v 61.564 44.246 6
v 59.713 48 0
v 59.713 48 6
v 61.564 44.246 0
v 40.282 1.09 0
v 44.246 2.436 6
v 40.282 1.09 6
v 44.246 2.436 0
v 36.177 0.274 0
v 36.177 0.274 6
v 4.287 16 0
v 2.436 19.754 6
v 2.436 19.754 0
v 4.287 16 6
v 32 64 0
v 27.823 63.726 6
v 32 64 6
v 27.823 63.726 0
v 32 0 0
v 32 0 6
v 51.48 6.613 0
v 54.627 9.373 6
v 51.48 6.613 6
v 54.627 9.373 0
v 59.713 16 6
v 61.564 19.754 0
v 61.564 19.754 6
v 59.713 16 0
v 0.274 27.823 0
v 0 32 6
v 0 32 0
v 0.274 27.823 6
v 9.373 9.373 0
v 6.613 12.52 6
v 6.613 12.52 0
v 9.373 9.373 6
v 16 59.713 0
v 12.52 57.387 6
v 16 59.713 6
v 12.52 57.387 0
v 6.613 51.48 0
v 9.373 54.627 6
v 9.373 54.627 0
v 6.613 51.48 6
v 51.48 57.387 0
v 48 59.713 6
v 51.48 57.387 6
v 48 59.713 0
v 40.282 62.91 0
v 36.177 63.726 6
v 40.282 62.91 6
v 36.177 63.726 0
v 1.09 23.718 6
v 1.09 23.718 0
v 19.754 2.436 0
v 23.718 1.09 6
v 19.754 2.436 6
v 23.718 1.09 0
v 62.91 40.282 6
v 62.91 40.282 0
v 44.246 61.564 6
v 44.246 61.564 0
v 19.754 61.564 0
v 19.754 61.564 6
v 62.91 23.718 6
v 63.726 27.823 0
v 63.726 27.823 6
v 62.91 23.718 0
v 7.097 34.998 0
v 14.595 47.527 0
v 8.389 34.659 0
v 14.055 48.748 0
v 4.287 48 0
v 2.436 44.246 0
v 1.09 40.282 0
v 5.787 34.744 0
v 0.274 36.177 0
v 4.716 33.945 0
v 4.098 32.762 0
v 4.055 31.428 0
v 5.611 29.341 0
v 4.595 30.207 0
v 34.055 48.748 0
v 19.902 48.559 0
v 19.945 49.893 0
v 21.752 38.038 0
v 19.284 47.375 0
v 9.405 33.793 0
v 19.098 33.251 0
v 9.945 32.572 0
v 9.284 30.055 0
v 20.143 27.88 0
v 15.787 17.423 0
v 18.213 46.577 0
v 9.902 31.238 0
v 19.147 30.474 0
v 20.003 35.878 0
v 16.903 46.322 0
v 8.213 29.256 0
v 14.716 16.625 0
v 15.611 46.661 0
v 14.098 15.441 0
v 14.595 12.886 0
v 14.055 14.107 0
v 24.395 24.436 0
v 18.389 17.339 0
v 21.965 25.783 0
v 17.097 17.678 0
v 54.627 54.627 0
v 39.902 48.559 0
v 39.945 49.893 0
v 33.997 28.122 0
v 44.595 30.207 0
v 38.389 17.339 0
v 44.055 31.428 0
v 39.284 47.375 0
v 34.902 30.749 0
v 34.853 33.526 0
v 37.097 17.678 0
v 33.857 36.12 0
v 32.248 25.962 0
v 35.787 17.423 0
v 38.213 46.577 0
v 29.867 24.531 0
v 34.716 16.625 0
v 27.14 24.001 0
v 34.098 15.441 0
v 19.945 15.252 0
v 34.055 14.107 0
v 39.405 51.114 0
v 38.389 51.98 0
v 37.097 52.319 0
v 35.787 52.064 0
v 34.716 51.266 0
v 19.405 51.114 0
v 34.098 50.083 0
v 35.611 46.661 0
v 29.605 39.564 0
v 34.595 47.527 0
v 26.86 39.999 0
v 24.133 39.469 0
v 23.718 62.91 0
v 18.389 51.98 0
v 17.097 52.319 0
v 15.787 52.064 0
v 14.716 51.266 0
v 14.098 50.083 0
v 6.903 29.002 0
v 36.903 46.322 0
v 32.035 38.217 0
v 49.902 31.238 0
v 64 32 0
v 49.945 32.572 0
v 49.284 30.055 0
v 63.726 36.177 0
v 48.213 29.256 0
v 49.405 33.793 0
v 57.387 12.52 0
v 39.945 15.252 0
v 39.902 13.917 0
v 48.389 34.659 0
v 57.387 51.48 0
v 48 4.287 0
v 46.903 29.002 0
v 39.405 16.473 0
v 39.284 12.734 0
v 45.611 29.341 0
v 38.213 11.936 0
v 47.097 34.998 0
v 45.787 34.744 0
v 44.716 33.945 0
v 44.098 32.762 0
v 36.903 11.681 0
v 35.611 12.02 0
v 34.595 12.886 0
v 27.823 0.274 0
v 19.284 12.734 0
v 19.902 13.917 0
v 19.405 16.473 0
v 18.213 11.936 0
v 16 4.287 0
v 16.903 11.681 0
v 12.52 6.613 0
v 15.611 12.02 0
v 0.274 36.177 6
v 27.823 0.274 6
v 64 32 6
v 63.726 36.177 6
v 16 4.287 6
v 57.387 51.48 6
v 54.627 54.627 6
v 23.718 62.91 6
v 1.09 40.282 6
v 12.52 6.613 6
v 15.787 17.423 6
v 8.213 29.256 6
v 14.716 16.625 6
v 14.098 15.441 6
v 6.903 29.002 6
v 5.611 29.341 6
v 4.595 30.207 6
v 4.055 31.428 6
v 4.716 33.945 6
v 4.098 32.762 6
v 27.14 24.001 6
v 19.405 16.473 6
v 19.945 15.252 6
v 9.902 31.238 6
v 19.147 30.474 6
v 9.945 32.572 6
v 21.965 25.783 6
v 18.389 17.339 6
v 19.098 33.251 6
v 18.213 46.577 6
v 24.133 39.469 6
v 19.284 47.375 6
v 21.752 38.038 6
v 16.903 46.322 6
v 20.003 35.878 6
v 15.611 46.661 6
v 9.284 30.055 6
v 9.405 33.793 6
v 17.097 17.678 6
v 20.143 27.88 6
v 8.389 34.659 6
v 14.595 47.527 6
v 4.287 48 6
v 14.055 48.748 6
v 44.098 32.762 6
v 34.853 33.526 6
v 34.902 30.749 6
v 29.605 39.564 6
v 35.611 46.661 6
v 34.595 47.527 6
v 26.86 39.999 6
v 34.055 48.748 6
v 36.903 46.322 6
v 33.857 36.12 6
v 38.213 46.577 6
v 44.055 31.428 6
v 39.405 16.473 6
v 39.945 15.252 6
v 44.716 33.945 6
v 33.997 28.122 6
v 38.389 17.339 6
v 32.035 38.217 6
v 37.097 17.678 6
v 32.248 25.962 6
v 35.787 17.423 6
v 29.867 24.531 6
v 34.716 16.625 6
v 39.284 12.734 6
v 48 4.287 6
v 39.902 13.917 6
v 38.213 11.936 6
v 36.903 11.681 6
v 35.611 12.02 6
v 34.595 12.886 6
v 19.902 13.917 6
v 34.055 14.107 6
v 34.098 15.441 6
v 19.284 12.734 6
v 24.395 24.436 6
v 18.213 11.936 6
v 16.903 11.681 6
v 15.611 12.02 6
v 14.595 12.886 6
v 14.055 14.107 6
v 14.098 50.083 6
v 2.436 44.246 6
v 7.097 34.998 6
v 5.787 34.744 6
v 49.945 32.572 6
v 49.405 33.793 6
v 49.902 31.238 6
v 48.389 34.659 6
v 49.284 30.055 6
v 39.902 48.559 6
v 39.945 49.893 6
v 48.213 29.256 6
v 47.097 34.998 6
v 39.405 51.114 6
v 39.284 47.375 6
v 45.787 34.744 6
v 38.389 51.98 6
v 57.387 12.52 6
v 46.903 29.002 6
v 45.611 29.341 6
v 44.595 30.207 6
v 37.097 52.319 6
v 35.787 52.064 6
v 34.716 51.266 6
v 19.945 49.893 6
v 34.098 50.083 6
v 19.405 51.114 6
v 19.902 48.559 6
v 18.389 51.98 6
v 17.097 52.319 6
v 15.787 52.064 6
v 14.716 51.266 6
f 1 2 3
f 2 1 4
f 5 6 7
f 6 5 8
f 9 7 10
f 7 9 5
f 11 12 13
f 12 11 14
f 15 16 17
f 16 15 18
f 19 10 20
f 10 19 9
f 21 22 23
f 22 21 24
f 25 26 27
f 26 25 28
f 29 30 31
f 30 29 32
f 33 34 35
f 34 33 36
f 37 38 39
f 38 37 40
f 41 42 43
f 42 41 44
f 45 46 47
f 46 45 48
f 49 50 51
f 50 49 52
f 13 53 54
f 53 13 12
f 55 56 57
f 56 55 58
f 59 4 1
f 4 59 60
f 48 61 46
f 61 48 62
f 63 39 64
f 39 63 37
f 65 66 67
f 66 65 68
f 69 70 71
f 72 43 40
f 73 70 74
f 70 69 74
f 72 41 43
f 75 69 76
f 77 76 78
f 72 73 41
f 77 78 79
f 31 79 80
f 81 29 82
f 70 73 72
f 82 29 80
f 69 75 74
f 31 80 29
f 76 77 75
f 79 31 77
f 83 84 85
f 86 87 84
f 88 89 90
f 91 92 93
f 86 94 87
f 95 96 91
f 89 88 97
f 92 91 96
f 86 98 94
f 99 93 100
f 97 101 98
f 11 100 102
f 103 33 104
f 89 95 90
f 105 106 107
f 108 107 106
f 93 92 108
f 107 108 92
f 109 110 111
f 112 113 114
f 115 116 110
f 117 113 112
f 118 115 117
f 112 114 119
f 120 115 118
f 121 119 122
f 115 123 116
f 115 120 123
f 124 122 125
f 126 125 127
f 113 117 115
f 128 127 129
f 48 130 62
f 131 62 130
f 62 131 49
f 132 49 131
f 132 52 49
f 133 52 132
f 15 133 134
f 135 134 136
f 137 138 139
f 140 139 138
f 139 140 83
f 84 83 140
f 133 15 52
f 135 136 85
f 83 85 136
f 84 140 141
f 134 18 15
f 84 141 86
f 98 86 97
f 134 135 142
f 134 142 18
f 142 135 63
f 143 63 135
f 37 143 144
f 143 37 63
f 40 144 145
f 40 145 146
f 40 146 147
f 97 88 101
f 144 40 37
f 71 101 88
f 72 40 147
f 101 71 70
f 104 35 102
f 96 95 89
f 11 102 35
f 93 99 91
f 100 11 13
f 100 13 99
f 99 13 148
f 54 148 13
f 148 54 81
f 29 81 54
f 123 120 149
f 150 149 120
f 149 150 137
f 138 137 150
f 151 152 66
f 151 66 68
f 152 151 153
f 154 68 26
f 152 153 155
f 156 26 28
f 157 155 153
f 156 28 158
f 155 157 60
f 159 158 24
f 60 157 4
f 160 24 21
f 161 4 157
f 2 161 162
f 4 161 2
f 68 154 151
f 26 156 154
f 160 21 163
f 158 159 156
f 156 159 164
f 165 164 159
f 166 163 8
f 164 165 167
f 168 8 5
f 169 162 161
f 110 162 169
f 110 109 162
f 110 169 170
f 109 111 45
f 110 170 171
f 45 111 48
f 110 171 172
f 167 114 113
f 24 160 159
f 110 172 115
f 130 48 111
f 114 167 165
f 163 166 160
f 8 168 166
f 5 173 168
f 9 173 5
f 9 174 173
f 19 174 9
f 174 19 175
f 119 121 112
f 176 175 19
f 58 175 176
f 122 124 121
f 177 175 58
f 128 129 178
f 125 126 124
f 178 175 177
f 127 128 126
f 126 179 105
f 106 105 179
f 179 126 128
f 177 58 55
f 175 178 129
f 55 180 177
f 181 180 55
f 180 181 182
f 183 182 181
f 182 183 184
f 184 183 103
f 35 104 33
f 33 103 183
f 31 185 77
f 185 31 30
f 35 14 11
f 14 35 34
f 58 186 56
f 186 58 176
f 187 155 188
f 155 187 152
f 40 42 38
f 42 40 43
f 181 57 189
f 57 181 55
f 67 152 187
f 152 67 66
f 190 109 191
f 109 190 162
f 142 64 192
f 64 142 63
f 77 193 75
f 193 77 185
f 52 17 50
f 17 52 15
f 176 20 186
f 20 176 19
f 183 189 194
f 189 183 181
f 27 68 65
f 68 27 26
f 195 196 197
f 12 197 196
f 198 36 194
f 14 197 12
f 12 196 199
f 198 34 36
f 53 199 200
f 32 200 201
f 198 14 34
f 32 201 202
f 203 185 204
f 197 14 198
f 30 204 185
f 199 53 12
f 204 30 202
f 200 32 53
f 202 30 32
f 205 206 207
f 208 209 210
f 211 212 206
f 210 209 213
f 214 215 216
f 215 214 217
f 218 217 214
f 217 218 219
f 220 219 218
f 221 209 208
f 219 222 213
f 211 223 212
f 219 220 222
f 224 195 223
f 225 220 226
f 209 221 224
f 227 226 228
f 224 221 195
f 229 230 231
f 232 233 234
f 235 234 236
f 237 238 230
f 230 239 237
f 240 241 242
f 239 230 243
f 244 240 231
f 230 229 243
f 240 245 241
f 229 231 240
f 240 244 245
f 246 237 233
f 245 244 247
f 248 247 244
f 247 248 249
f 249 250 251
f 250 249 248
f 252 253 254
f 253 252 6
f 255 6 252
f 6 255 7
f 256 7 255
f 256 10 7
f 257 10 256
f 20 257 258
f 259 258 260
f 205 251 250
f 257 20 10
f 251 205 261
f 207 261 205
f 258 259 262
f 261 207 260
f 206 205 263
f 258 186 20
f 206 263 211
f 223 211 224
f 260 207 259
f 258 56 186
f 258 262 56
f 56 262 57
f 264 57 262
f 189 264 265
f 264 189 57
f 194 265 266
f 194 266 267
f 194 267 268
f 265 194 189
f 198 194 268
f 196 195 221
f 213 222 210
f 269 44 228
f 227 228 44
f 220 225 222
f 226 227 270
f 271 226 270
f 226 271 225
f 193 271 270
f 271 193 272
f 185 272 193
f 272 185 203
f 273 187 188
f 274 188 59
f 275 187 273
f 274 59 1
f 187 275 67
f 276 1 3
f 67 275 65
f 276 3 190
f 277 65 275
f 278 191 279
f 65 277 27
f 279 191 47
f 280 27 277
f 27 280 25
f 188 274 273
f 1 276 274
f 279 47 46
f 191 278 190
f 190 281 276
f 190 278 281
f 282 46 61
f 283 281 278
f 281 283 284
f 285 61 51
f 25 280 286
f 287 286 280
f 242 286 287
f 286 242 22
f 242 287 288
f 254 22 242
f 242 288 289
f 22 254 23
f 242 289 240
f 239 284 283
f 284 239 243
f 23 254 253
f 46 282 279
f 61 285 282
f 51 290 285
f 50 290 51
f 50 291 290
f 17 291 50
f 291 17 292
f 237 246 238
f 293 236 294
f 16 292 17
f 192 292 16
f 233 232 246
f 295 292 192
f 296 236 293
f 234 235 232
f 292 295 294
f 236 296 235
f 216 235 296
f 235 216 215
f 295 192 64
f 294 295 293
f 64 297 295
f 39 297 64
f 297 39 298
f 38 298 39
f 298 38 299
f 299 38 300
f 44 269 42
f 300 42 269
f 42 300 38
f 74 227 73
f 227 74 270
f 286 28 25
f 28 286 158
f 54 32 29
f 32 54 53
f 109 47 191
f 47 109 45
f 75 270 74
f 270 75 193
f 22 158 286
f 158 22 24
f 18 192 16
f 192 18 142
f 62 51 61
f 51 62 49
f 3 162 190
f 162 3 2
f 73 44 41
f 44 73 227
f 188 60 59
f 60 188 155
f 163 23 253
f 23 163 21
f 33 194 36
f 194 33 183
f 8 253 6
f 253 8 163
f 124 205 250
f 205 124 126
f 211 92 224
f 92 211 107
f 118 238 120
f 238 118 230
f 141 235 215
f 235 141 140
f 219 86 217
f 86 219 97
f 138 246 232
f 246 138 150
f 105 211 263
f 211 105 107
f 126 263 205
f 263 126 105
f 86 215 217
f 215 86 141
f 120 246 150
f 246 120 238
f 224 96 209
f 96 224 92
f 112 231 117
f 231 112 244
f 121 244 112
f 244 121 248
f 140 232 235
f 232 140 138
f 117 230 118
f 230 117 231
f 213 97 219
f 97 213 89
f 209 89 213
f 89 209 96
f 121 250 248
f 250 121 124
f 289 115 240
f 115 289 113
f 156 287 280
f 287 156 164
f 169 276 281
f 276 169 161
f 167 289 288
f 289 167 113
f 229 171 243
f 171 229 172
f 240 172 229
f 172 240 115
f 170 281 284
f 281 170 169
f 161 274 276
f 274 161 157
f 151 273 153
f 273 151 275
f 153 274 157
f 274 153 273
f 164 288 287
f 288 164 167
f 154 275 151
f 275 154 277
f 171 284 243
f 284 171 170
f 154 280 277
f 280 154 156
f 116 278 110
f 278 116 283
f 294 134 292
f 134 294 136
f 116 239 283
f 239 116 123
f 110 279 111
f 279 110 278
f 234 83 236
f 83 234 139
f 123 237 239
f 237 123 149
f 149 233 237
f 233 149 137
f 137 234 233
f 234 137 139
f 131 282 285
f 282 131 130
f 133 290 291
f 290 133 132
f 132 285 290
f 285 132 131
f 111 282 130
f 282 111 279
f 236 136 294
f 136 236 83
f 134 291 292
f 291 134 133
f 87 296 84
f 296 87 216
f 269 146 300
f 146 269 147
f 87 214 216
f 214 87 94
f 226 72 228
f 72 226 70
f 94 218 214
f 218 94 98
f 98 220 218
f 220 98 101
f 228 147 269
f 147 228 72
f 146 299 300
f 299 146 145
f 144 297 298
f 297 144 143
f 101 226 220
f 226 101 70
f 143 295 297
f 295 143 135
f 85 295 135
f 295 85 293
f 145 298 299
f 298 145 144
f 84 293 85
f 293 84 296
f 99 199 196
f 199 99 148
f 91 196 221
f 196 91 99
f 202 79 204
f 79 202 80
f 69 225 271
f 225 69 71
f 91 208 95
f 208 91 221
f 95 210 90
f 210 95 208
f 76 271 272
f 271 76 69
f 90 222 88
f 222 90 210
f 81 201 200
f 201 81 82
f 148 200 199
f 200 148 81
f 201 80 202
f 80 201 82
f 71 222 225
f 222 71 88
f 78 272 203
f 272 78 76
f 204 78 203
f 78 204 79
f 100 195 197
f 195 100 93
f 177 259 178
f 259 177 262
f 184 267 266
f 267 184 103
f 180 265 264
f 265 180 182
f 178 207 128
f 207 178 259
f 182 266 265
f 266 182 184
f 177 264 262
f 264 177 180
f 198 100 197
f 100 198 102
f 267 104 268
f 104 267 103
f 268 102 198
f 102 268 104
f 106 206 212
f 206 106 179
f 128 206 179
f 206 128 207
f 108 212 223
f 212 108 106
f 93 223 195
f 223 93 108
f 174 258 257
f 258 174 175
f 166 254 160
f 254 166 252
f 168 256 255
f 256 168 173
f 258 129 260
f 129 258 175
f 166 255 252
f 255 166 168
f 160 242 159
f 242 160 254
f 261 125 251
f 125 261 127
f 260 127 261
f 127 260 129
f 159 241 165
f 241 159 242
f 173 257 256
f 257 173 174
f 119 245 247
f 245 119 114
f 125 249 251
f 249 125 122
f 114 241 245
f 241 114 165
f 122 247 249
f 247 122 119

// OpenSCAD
$fn = 32;

// ----------------------------------------------------------------------
// Cam plate: eccentric cam, base R32
// ----------------------------------------------------------------------

// --- parameters (mm) ---
base_r = 32;              // base circle radius
lobe_h = 14;              // cam lobe rise
bore_r = 8;               // shaft bore radius
plate_t = 6;              // plate thickness, Z (extrusion height)
ecc = 5;                  // disc eccentricity
ring_r = 20;              // lightening ring radius
bolt_r = 3;               // lightening hole radius

profile = [[64, 32], [63.726, 36.177], [62.91, 40.282], [61.564, 44.246], [59.713, 48], [57.387, 51.48], [54.627, 54.627], [51.48, 57.387], [48, 59.713], [44.246, 61.564], [40.282, 62.91], [36.177, 63.726], [32, 64], [27.823, 63.726], [23.718, 62.91], [19.754, 61.564], [16, 59.713], [12.52, 57.387], [9.373, 54.627], [6.613, 51.48], [4.287, 48], [2.436, 44.246], [1.09, 40.282], [0.274, 36.177], [0, 32], [0.274, 27.823], [1.09, 23.718], [2.436, 19.754], [4.287, 16], [6.613, 12.52], [9.373, 9.373], [12.52, 6.613], [16, 4.287], [19.754, 2.436], [23.718, 1.09], [27.823, 0.274], [32, 0], [36.177, 0.274], [40.282, 1.09], [44.246, 2.436], [48, 4.287], [51.48, 6.613], [54.627, 9.373], [57.387, 12.52], [59.713, 16], [61.564, 19.754], [62.91, 23.718], [63.726, 27.823]];  // primary outline, 48 points, counter clockwise
void_1 = [[34.853, 33.526], [33.857, 36.12], [32.035, 38.217], [29.605, 39.564], [26.86, 39.999], [24.133, 39.469], [21.752, 38.038], [20.003, 35.878], [19.098, 33.251], [19.147, 30.474], [20.143, 27.88], [21.965, 25.783], [24.395, 24.436], [27.14, 24.001], [29.867, 24.531], [32.248, 25.962], [33.997, 28.122], [34.902, 30.749]];  // shaft bore, 18 points
void_2 = [[49.945, 32.572], [49.405, 33.793], [48.389, 34.659], [47.097, 34.998], [45.787, 34.744], [44.716, 33.945], [44.098, 32.762], [44.055, 31.428], [44.595, 30.207], [45.611, 29.341], [46.903, 29.002], [48.213, 29.256], [49.284, 30.055], [49.902, 31.238]];  // lightening hole 1, 14 points
void_3 = [[39.945, 49.893], [39.405, 51.114], [38.389, 51.98], [37.097, 52.319], [35.787, 52.064], [34.716, 51.266], [34.098, 50.083], [34.055, 48.748], [34.595, 47.527], [35.611, 46.661], [36.903, 46.322], [38.213, 46.577], [39.284, 47.375], [39.902, 48.559]];  // lightening hole 2, 14 points
void_4 = [[19.945, 49.893], [19.405, 51.114], [18.389, 51.98], [17.097, 52.319], [15.787, 52.064], [14.716, 51.266], [14.098, 50.083], [14.055, 48.748], [14.595, 47.527], [15.611, 46.661], [16.903, 46.322], [18.213, 46.577], [19.284, 47.375], [19.902, 48.559]];  // lightening hole 3, 14 points
void_5 = [[9.945, 32.572], [9.405, 33.793], [8.389, 34.659], [7.097, 34.998], [5.787, 34.744], [4.716, 33.945], [4.098, 32.762], [4.055, 31.428], [4.595, 30.207], [5.611, 29.341], [6.903, 29.002], [8.213, 29.256], [9.284, 30.055], [9.902, 31.238]];  // lightening hole 4, 14 points
void_6 = [[19.945, 15.252], [19.405, 16.473], [18.389, 17.339], [17.097, 17.678], [15.787, 17.423], [14.716, 16.625], [14.098, 15.441], [14.055, 14.107], [14.595, 12.886], [15.611, 12.02], [16.903, 11.681], [18.213, 11.936], [19.284, 12.734], [19.902, 13.917]];  // lightening hole 5, 14 points
void_7 = [[39.945, 15.252], [39.405, 16.473], [38.389, 17.339], [37.097, 17.678], [35.787, 17.423], [34.716, 16.625], [34.098, 15.441], [34.055, 14.107], [34.595, 12.886], [35.611, 12.02], [36.903, 11.681], [38.213, 11.936], [39.284, 12.734], [39.902, 13.917]];  // lightening hole 6, 14 points

// --- the one profile operation ---
difference() {
  linear_extrude(height = plate_t) polygon(points = profile);
  translate([0, 0, -1])
    linear_extrude(height = plate_t + 2) polygon(points = void_1);
  translate([0, 0, -1])
    linear_extrude(height = plate_t + 2) polygon(points = void_2);
  translate([0, 0, -1])
    linear_extrude(height = plate_t + 2) polygon(points = void_3);
  translate([0, 0, -1])
    linear_extrude(height = plate_t + 2) polygon(points = void_4);
  translate([0, 0, -1])
    linear_extrude(height = plate_t + 2) polygon(points = void_5);
  translate([0, 0, -1])
    linear_extrude(height = plate_t + 2) polygon(points = void_6);
  translate([0, 0, -1])
    linear_extrude(height = plate_t + 2) polygon(points = void_7);
}
